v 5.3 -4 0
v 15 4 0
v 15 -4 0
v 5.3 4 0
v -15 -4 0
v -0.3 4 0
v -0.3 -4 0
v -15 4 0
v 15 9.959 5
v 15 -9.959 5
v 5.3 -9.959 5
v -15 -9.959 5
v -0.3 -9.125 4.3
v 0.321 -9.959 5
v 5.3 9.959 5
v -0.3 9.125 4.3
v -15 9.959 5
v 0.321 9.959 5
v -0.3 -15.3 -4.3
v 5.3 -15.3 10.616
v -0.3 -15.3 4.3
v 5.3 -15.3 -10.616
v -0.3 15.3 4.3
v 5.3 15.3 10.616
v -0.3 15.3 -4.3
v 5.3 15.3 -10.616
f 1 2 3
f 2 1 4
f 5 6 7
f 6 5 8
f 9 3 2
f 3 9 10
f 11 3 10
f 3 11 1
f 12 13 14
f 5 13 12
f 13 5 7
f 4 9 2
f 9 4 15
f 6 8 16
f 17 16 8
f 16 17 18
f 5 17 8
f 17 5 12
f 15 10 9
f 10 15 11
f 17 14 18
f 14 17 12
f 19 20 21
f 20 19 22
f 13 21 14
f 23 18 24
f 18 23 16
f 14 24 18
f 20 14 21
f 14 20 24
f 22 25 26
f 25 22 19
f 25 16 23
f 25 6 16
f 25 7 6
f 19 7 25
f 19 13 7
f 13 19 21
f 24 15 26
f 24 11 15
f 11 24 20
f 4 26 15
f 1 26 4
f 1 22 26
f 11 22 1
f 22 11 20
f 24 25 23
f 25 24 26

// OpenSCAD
// Dovetail Joint Primitives
// Chamfered dovetail joints for support-free 3D printing

// Default parameters
default_dovetail_angle = 50;      // Angle from vertical (degrees)
default_dovetail_height = 5;      // Trapezoid height (mm)
default_dovetail_length = 30;     // Length along edge (mm)
default_dovetail_base_width = 8;  // Width at narrow end (mm)
default_clearance = 0.3;          // Clearance per side (mm)

// Calculate top width from base width, height, and angle
function dovetail_top_width(base_width, height, angle) =
    base_width + 2 * height * tan(angle);

// Male dovetail rail - trapezoidal extrusion
// Origin at center of the rail base
// Cross-section in YZ plane: width in Y, height in +Z
// Extrudes along +X (length direction)
// Rail widens in +Z direction (trapezoid shape)
module male_dovetail(
    length = default_dovetail_length,
    height = default_dovetail_height,
    base_width = default_dovetail_base_width,
    angle = default_dovetail_angle
) {
    top_width = dovetail_top_width(base_width, height, angle);

    // Trapezoidal cross-section rotated 90° CW on Z then 90° CW on X
    rotate([-90, 180, 90])
    linear_extrude(height = length, center = true)
        polygon([
            [-base_width/2, 0],      // bottom left
            [base_width/2, 0],       // bottom right
            [top_width/2, height],   // top right
            [-top_width/2, height]   // top left
        ]);
}

// Female dovetail channel - trapezoidal cutout
// Same profile as male but with clearance added
// Origin at center of the channel base
// Cross-section in YZ plane: width in Y, height in +Z
// Extrudes along +X (length direction)
// Channel widens in +Z direction (trapezoid shape)
module female_dovetail(
    length = default_dovetail_length,
    height = default_dovetail_height,
    base_width = default_dovetail_base_width,
    angle = default_dovetail_angle,
    clearance = default_clearance
) {
    // Add clearance to all dimensions
    adj_base_width = base_width + 2 * clearance;
    adj_height = height + clearance;
    top_width = dovetail_top_width(adj_base_width, adj_height, angle);
    adj_length = length + 2 * clearance;

    // Trapezoidal cross-section rotated 90° CW on Z then 90° CW on X
    rotate([-90, 0, 0])
    rotate([0, 0, -90])
    linear_extrude(height = adj_length, center = true)
        polygon([
            [-adj_base_width/2, -clearance],  // bottom left (extra height for clearance)
            [adj_base_width/2, -clearance],   // bottom right
            [top_width/2, adj_height],        // top right
            [-top_width/2, adj_height]        // top left
        ]);
}

// Test visualization
module dovetail_test() {
    // Show male (red) and female (blue, transparent) overlapping
    color("red") male_dovetail();
    color("blue", 0.3) female_dovetail();
}

// Uncomment to test
dovetail_test();
